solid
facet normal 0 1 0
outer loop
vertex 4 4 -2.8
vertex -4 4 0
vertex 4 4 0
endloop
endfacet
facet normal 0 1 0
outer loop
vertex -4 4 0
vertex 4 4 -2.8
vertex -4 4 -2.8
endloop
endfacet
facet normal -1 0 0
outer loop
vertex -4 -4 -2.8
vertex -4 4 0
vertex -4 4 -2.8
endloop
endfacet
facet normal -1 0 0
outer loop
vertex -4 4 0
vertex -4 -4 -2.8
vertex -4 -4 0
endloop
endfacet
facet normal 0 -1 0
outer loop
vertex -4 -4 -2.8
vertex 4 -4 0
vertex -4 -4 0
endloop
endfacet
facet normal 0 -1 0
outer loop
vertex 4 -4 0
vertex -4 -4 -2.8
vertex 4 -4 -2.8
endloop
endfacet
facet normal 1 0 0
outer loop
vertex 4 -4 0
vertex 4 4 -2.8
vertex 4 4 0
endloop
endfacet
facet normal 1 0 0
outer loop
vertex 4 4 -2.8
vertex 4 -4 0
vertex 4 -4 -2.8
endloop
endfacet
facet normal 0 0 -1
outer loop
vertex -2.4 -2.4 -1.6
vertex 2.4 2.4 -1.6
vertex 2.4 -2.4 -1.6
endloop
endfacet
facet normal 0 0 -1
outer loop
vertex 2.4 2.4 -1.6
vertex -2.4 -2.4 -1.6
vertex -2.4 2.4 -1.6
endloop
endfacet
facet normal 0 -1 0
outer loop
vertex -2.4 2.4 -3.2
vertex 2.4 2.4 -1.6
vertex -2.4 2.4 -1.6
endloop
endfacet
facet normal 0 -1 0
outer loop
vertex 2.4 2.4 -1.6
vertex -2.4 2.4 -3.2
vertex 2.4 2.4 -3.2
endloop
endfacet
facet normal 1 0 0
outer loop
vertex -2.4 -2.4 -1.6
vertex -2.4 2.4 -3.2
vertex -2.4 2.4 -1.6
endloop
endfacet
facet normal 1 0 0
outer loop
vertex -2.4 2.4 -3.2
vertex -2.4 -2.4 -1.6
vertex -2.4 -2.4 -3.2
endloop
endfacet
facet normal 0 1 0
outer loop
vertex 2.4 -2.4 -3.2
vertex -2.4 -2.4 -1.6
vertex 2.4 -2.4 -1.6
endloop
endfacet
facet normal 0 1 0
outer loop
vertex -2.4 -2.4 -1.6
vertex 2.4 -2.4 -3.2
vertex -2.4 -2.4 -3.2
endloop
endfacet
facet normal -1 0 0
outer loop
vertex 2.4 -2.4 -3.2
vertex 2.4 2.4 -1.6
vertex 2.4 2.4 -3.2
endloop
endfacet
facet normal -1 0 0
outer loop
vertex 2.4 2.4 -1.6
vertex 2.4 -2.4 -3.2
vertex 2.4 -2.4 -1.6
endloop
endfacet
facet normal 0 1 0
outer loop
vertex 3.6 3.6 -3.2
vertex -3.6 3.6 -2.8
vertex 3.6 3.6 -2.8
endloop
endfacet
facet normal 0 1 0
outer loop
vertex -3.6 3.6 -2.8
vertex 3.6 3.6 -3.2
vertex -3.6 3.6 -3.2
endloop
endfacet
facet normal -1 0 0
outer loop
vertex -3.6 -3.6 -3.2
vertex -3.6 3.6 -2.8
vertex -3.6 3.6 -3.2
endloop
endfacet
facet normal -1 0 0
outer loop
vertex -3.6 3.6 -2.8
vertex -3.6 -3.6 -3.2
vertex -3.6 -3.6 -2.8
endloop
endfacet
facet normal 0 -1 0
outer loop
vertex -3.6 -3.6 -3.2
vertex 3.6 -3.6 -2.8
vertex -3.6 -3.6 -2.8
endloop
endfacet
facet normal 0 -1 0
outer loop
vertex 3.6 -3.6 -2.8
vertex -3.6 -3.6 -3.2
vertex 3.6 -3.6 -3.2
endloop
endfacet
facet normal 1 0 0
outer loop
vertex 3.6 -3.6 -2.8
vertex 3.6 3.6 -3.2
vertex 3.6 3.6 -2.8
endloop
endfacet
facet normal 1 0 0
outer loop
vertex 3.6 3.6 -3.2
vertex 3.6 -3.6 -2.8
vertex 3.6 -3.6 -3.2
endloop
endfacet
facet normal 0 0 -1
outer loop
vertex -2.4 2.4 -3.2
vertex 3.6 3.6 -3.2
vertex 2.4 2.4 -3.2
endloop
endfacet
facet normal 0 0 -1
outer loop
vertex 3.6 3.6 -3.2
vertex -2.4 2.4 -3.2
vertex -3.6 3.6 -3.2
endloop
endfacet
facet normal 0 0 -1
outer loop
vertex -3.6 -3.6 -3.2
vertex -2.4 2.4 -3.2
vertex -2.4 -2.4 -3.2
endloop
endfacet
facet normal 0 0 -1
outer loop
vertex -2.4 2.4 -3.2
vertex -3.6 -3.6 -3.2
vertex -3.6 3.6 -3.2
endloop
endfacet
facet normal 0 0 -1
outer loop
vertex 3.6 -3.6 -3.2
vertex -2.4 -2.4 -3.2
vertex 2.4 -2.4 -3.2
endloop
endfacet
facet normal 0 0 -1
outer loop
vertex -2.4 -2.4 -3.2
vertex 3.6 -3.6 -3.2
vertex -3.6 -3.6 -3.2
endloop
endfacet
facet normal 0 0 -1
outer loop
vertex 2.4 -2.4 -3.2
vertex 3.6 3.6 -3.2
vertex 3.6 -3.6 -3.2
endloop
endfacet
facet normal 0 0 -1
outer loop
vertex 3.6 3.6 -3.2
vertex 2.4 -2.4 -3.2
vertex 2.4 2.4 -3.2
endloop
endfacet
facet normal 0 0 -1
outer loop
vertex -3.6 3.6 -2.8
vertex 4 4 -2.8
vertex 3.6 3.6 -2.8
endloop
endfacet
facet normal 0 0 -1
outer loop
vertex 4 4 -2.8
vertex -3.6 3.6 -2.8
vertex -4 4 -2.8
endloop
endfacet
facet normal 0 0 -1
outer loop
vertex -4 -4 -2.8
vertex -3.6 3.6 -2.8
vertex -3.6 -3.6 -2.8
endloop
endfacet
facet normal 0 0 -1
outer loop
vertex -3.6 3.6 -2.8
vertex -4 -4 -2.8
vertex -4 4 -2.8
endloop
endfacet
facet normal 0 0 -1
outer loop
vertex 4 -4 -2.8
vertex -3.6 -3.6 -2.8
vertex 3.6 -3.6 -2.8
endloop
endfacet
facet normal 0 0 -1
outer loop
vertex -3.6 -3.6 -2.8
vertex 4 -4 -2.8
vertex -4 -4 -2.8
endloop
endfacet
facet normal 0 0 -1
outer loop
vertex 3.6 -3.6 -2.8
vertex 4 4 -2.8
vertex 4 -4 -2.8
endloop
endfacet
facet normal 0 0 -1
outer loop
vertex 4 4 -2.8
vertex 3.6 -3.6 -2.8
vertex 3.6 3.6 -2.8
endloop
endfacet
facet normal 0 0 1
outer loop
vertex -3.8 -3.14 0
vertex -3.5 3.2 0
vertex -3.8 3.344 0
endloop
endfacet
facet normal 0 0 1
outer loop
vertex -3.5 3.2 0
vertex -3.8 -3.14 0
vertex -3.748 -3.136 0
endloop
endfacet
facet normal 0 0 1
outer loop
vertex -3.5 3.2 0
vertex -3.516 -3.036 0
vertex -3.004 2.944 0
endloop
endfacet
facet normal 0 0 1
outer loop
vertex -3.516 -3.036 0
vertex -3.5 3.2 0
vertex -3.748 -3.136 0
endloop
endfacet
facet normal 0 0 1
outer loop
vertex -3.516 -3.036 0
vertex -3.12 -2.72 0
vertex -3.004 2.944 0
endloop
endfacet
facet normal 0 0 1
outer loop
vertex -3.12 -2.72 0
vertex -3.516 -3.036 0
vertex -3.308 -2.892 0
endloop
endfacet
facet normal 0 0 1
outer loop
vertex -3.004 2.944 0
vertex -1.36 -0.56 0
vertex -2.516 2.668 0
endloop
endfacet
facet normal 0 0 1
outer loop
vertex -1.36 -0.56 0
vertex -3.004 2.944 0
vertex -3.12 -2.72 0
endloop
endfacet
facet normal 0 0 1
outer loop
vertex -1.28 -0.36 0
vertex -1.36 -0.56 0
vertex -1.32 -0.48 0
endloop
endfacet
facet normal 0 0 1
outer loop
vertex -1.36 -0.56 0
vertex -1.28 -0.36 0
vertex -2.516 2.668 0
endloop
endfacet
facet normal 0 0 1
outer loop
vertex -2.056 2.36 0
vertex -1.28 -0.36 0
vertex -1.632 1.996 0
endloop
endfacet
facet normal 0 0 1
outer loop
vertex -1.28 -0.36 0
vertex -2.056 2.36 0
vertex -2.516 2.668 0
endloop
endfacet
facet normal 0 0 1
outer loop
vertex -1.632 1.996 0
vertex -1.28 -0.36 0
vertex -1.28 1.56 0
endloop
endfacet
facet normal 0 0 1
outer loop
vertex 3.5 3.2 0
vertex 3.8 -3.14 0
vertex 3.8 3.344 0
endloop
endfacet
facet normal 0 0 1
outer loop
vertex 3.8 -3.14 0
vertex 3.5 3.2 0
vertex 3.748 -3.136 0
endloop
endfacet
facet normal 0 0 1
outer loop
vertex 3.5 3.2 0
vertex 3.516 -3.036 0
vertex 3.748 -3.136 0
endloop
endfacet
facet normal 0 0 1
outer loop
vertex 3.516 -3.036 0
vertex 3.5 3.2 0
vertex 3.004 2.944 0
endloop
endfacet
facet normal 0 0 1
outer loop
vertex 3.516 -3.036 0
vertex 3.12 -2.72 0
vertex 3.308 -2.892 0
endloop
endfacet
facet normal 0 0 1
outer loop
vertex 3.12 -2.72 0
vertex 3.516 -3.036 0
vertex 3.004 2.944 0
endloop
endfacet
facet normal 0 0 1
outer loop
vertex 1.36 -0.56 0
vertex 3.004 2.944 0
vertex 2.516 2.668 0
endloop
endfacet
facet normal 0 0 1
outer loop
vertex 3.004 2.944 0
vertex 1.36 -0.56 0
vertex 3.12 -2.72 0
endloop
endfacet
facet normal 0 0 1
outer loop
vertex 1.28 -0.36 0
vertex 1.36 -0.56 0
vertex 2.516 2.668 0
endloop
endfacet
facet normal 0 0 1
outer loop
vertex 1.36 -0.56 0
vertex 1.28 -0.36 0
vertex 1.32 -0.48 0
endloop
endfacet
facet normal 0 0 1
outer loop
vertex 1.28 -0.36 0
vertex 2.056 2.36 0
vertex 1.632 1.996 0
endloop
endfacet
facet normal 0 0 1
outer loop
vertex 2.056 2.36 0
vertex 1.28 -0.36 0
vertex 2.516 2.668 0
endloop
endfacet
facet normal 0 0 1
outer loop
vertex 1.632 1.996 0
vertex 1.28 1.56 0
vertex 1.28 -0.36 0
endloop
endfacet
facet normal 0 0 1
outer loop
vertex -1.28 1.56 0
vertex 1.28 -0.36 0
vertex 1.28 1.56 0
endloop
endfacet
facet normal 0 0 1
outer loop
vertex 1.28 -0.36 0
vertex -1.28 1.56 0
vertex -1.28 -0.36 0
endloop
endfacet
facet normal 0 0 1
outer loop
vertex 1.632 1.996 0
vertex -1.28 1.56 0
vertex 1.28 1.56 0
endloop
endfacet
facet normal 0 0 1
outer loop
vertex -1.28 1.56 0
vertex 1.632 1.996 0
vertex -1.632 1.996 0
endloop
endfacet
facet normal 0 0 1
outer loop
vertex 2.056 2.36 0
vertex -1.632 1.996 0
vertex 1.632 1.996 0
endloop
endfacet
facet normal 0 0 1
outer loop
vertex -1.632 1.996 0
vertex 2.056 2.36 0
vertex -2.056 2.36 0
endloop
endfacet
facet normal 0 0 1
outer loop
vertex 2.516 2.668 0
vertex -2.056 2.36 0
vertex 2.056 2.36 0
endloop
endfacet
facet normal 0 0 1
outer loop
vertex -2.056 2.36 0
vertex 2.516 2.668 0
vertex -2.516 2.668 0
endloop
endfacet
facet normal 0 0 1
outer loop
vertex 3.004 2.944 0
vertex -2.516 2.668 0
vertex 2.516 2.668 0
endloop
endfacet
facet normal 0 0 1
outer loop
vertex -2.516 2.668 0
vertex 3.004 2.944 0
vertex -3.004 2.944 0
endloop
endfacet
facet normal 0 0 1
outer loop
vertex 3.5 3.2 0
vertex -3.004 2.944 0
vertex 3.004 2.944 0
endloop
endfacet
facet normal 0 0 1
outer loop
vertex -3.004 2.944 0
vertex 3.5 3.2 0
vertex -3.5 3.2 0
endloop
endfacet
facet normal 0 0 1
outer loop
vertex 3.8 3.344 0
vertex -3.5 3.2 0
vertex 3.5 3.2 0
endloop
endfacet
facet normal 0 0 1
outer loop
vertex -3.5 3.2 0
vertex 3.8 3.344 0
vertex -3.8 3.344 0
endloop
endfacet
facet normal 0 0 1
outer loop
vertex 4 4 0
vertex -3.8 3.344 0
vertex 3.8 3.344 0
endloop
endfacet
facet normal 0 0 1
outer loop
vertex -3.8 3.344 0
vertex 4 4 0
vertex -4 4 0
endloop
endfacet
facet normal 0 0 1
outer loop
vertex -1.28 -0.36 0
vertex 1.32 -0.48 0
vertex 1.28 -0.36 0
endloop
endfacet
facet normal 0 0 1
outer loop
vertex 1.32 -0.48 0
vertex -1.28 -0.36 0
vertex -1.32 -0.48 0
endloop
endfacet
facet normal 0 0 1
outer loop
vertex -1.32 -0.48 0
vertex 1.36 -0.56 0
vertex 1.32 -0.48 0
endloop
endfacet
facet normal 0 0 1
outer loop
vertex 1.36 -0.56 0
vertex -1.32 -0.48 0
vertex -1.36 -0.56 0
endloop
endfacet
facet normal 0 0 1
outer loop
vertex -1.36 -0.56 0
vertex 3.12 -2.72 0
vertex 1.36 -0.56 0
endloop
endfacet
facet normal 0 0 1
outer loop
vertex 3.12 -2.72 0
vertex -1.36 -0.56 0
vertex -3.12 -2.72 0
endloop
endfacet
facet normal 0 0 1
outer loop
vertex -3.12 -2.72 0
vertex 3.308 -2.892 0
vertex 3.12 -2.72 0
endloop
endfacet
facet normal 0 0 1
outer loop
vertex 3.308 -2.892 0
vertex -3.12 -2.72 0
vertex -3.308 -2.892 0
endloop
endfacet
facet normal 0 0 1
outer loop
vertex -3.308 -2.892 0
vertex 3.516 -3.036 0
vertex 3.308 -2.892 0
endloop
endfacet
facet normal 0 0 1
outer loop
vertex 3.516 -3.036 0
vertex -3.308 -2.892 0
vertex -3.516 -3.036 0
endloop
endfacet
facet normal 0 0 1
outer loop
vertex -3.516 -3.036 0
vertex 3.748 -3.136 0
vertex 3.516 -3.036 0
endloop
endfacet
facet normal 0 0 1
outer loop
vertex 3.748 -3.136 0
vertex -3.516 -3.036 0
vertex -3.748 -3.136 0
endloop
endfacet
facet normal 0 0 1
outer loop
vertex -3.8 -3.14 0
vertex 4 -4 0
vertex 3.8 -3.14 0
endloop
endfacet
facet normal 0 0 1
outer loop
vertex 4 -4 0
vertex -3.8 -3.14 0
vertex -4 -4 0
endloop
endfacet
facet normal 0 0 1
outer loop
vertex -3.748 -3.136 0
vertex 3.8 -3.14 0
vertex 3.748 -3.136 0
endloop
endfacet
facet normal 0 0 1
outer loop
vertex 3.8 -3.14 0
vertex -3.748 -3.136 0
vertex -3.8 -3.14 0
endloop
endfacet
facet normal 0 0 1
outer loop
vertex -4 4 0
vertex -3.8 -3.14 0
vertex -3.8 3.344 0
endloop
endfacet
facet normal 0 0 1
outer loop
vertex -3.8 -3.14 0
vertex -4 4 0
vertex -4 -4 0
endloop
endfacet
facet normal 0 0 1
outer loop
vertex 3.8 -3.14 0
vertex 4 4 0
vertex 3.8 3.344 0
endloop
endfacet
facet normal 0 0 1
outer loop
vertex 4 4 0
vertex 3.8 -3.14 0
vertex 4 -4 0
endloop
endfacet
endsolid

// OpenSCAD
// file: ../p/box5.scad
use <../lib.scad>
function ldraw_lib__box5() = [
// 0 Box with 5 Faces and All Edges
// 0 Name: box5.dat
// 0 Author: James Jessiman
// 0 !LDRAW_ORG Primitive UPDATE 2012-01
// 0 !LICENSE Licensed under CC BY 4.0 : see CAreadme.txt
// 
// 0 BFC CERTIFY CCW
  [0,"BFC","CERTIFY"],
  [0,"BFC","CCW"],
// 
// 0 !HISTORY 2002-04-03 [sbliss] Modified for BFC compliance
// 0 !HISTORY 2002-04-25 [PTadmin] Official Update 2002-02
// 0 !HISTORY 2007-06-24 [PTadmin] Header formatted for Contributor Agreement
// 0 !HISTORY 2008-07-01 [PTadmin] Official Update 2008-01
// 0 !HISTORY 2012-02-16 [Philo] Changed to CCW
// 0 !HISTORY 2012-03-30 [PTadmin] Official Update 2012-01
// 
// 
// 2 24 1 1 1 -1 1 1
  [2,24,1,1,1,-1,1,1],
// 2 24 -1 1 1 -1 1 -1
  [2,24,-1,1,1,-1,1,-1],
// 2 24 -1 1 -1 1 1 -1
  [2,24,-1,1,-1,1,1,-1],
// 2 24 1 1 -1 1 1 1
  [2,24,1,1,-1,1,1,1],
// 2 24 1 0 1 -1 0 1
  [2,24,1,0,1,-1,0,1],
// 2 24 -1 0 1 -1 0 -1
  [2,24,-1,0,1,-1,0,-1],
// 2 24 -1 0 -1 1 0 -1
  [2,24,-1,0,-1,1,0,-1],
// 2 24 1 0 -1 1 0 1
  [2,24,1,0,-1,1,0,1],
// 2 24 1 0 1 1 1 1
  [2,24,1,0,1,1,1,1],
// 2 24 -1 0 1 -1 1 1
  [2,24,-1,0,1,-1,1,1],
// 2 24 1 0 -1 1 1 -1
  [2,24,1,0,-1,1,1,-1],
// 2 24 -1 0 -1 -1 1 -1
  [2,24,-1,0,-1,-1,1,-1],
// 4 16 -1 1 1 1 1 1 1 1 -1 -1 1 -1
  [4,16,-1,1,1,1,1,1,1,1,-1,-1,1,-1],
// 4 16 -1 1 1 -1 0 1 1 0 1 1 1 1
  [4,16,-1,1,1,-1,0,1,1,0,1,1,1,1],
// 4 16 -1 1 -1 -1 0 -1 -1 0 1 -1 1 1
  [4,16,-1,1,-1,-1,0,-1,-1,0,1,-1,1,1],
// 4 16 1 1 -1 1 0 -1 -1 0 -1 -1 1 -1
  [4,16,1,1,-1,1,0,-1,-1,0,-1,-1,1,-1],
// 4 16 1 1 1 1 0 1 1 0 -1 1 1 -1
  [4,16,1,1,1,1,0,1,1,0,-1,1,1,-1],
];
module ldraw_lib__box5(step=0, col=false, unit=2/5, alt=false, line=0.2, solid=!$preview)
    makepoly(ldraw_lib__box5(), step=step, col=col, unit=unit, alt=alt, line=line, solid=solid);
ldraw_lib__box5(line=0.2);
// file: ../p/box4.scad
use <../lib.scad>
function ldraw_lib__box4() = [
// 0 Box with 4 Faces (2 Parallel Pairs) and All Edges
// 0 Name: box4.dat
// 0 Author: James Jessiman
// 0 !LDRAW_ORG Primitive UPDATE 2012-01
// 0 !LICENSE Licensed under CC BY 4.0 : see CAreadme.txt
// 
// 0 BFC CERTIFY CCW
  [0,"BFC","CERTIFY"],
  [0,"BFC","CCW"],
// 
// 0 !HISTORY 2002-04-03 [sbliss] Modified for BFC compliance
// 0 !HISTORY 2002-04-25 [PTadmin] Official Update 2002-02
// 0 !HISTORY 2007-06-24 [PTadmin] Header formatted for Contributor Agreement
// 0 !HISTORY 2008-07-01 [PTadmin] Official Update 2008-01
// 0 !HISTORY 2012-02-16 [Philo] Changed to CCW
// 0 !HISTORY 2012-03-30 [PTadmin] Official Update 2012-01
// 
// 
// 2 24 1 1 1 -1 1 1
  [2,24,1,1,1,-1,1,1],
// 2 24 -1 1 1 -1 1 -1
  [2,24,-1,1,1,-1,1,-1],
// 2 24 -1 1 -1 1 1 -1
  [2,24,-1,1,-1,1,1,-1],
// 2 24 1 1 -1 1 1 1
  [2,24,1,1,-1,1,1,1],
// 2 24 1 0 1 -1 0 1
  [2,24,1,0,1,-1,0,1],
// 2 24 -1 0 1 -1 0 -1
  [2,24,-1,0,1,-1,0,-1],
// 2 24 -1 0 -1 1 0 -1
  [2,24,-1,0,-1,1,0,-1],
// 2 24 1 0 -1 1 0 1
  [2,24,1,0,-1,1,0,1],
// 2 24 1 0 1 1 1 1
  [2,24,1,0,1,1,1,1],
// 2 24 -1 0 1 -1 1 1
  [2,24,-1,0,1,-1,1,1],
// 2 24 1 0 -1 1 1 -1
  [2,24,1,0,-1,1,1,-1],
// 2 24 -1 0 -1 -1 1 -1
  [2,24,-1,0,-1,-1,1,-1],
// 4 16 -1 1 1 -1 0 1 1 0 1 1 1 1
  [4,16,-1,1,1,-1,0,1,1,0,1,1,1,1],
// 4 16 -1 1 -1 -1 0 -1 -1 0 1 -1 1 1
  [4,16,-1,1,-1,-1,0,-1,-1,0,1,-1,1,1],
// 4 16 1 1 -1 1 0 -1 -1 0 -1 -1 1 -1
  [4,16,1,1,-1,1,0,-1,-1,0,-1,-1,1,-1],
// 4 16 1 1 1 1 0 1 1 0 -1 1 1 -1
  [4,16,1,1,1,1,0,1,1,0,-1,1,1,-1],
];
module ldraw_lib__box4(step=0, col=false, unit=2/5, alt=false, line=0.2, solid=!$preview)
    makepoly(ldraw_lib__box4(), step=step, col=col, unit=unit, alt=alt, line=line, solid=solid);
ldraw_lib__box4(line=0.2);
// file: s/3070bs01.scad
use <../../lib.scad>
use <../../p/box4.scad>
use <../../p/box5.scad>
function ldraw_lib__s__3070bs01() = [
// 0 ~Tile  1 x  1 with Groove without Top Face
// 0 Name: s\3070bs01.dat
// 0 Author: Chris Dee [cwdee]
// 0 !LDRAW_ORG Subpart UPDATE 2009-02
// 0 !LICENSE Licensed under CC BY 4.0 : see CAreadme.txt
// 
// 0 BFC CERTIFY CCW
  [0,"BFC","CERTIFY"],
  [0,"BFC","CCW"],
// 
// 0 !HISTORY 2009-09-03 [PTadmin] Official Update 2009-02
// 
// 
// 1 16 0 0 0 10 0 0 0 7 0 0 0 10 box4.dat
  [1,16,0,0,0,10,0,0,0,7,0,0,0,10, ldraw_lib__box4()],
// 0 BFC INVERTNEXT
  [0,"BFC","INVERTNEXT"],
// 1 16 0 8 0 6 0 0 0 -4 0 0 0 6 box5.dat
  [1,16,0,8,0,6,0,0,0,-4,0,0,0,6, ldraw_lib__box5()],
// 1 16 0 7 0 9 0 0 0 1 0 0 0 9 box4.dat
  [1,16,0,7,0,9,0,0,0,1,0,0,0,9, ldraw_lib__box4()],
// 
// 4 16 9 8 9 6 8 6 -6 8 6 -9 8 9
  [4,16,9,8,9,6,8,6,-6,8,6,-9,8,9],
// 4 16 -9 8 9 -6 8 6 -6 8 -6 -9 8 -9
  [4,16,-9,8,9,-6,8,6,-6,8,-6,-9,8,-9],
// 4 16 -9 8 -9 -6 8 -6 6 8 -6 9 8 -9
  [4,16,-9,8,-9,-6,8,-6,6,8,-6,9,8,-9],
// 4 16 9 8 -9 6 8 -6 6 8 6 9 8 9
  [4,16,9,8,-9,6,8,-6,6,8,6,9,8,9],
// 
// 4 16 10 7 10 9 7 9 -9 7 9 -10 7 10
  [4,16,10,7,10,9,7,9,-9,7,9,-10,7,10],
// 4 16 -10 7 10 -9 7 9 -9 7 -9 -10 7 -10
  [4,16,-10,7,10,-9,7,9,-9,7,-9,-10,7,-10],
// 4 16 -10 7 -10 -9 7 -9 9 7 -9 10 7 -10
  [4,16,-10,7,-10,-9,7,-9,9,7,-9,10,7,-10],
// 4 16 10 7 -10 9 7 -9 9 7 9 10 7 10
  [4,16,10,7,-10,9,7,-9,9,7,9,10,7,10],
// 0
];
module ldraw_lib__s__3070bs01(step=0, col=false, unit=2/5, alt=false, line=0.2, solid=!$preview)
    makepoly(ldraw_lib__s__3070bs01(), step=step, col=col, unit=unit, alt=alt, line=line, solid=solid);
ldraw_lib__s__3070bs01(line=0.2);
// main file
use <../lib.scad>
use <s/3070bs01.scad>
function ldraw_lib__3070bpy1() = [
// 0 Tile  1 x  1 with Black Symmetrical Trapezoids Pattern
// 0 Name: 3070bpy1.dat
// 0 Author: Bertrand Lequy [Berth]
// 0 !LDRAW_ORG Part UPDATE 2024-07
// 0 !LICENSE Licensed under CC BY 4.0 : see CAreadme.txt
// 
// 0 BFC CERTIFY CCW
  [0,"BFC","CERTIFY"],
  [0,"BFC","CCW"],
// 
// 0 !KEYWORDS Bricklink 3070pb355, Rebrickable 3070bpr0312, Set 76922
// 
// 0 !HISTORY 2024-08-26 [OrionP] Official Update 2024-07
// 
// 1 16 0 0 0 1 0 0 0 1 0 0 0 1 s\3070bs01.dat
  [1,16,0,0,0,1,0,0,0,1,0,0,0,1, ldraw_lib__s__3070bs01()],
// 4 0 -9.37 0 -7.84 -8.75 0 8 -9.5 0 8.36 -9.5 0 -7.85
  [4,0,-9.37,0,-7.84,-8.75,0,8,-9.5,0,8.36,-9.5,0,-7.85],
// 4 0 -8.75 0 8 -9.37 0 -7.84 -8.79 0 -7.59 -7.51 0 7.36
  [4,0,-8.75,0,8,-9.37,0,-7.84,-8.79,0,-7.59,-7.51,0,7.36],
// 4 0 -7.51 0 7.36 -8.79 0 -7.59 -8.27 0 -7.23 -7.8 0 -6.8
  [4,0,-7.51,0,7.36,-8.79,0,-7.59,-8.27,0,-7.23,-7.8,0,-6.8],
// 4 0 -6.29 0 6.67 -7.51 0 7.36 -7.8 0 -6.8 -3.4 0 -1.4
  [4,0,-6.29,0,6.67,-7.51,0,7.36,-7.8,0,-6.8,-3.4,0,-1.4],
// 4 0 -6.29 0 6.67 -3.4 0 -1.4 -3.3 0 -1.2 -3.2 0 -0.9
  [4,0,-6.29,0,6.67,-3.4,0,-1.4,-3.3,0,-1.2,-3.2,0,-0.9],
// 4 0 -5.14 0 5.9 -6.29 0 6.67 -3.2 0 -0.9 -4.08 0 4.99
  [4,0,-5.14,0,5.9,-6.29,0,6.67,-3.2,0,-0.9,-4.08,0,4.99],
// 3 0 -4.08 0 4.99 -3.2 0 -0.9 -3.2 0 3.9
  [3,0,-4.08,0,4.99,-3.2,0,-0.9,-3.2,0,3.9],
// 4 0 9.5 0 8.36 8.75 0 8 9.37 0 -7.84 9.5 0 -7.85
  [4,0,9.5,0,8.36,8.75,0,8,9.37,0,-7.84,9.5,0,-7.85],
// 4 0 8.79 0 -7.59 9.37 0 -7.84 8.75 0 8 7.51 0 7.36
  [4,0,8.79,0,-7.59,9.37,0,-7.84,8.75,0,8,7.51,0,7.36],
// 4 0 8.27 0 -7.23 8.79 0 -7.59 7.51 0 7.36 7.8 0 -6.8
  [4,0,8.27,0,-7.23,8.79,0,-7.59,7.51,0,7.36,7.8,0,-6.8],
// 4 0 7.8 0 -6.8 7.51 0 7.36 6.29 0 6.67 3.4 0 -1.4
  [4,0,7.8,0,-6.8,7.51,0,7.36,6.29,0,6.67,3.4,0,-1.4],
// 4 0 3.3 0 -1.2 3.4 0 -1.4 6.29 0 6.67 3.2 0 -0.9
  [4,0,3.3,0,-1.2,3.4,0,-1.4,6.29,0,6.67,3.2,0,-0.9],
// 4 0 3.2 0 -0.9 6.29 0 6.67 5.14 0 5.9 4.08 0 4.99
  [4,0,3.2,0,-0.9,6.29,0,6.67,5.14,0,5.9,4.08,0,4.99],
// 3 0 4.08 0 4.99 3.2 0 3.9 3.2 0 -0.9
  [3,0,4.08,0,4.99,3.2,0,3.9,3.2,0,-0.9],
// 4 16 3.2 0 3.9 -3.2 0 3.9 -3.2 0 -0.9 3.2 0 -0.9
  [4,16,3.2,0,3.9,-3.2,0,3.9,-3.2,0,-0.9,3.2,0,-0.9],
// 4 16 -4.08 0 4.99 -3.2 0 3.9 3.2 0 3.9 4.08 0 4.99
  [4,16,-4.08,0,4.99,-3.2,0,3.9,3.2,0,3.9,4.08,0,4.99],
// 4 16 -5.14 0 5.9 -4.08 0 4.99 4.08 0 4.99 5.14 0 5.9
  [4,16,-5.14,0,5.9,-4.08,0,4.99,4.08,0,4.99,5.14,0,5.9],
// 4 16 -6.29 0 6.67 -5.14 0 5.9 5.14 0 5.9 6.29 0 6.67
  [4,16,-6.29,0,6.67,-5.14,0,5.9,5.14,0,5.9,6.29,0,6.67],
// 4 16 -7.51 0 7.36 -6.29 0 6.67 6.29 0 6.67 7.51 0 7.36
  [4,16,-7.51,0,7.36,-6.29,0,6.67,6.29,0,6.67,7.51,0,7.36],
// 4 16 -8.75 0 8 -7.51 0 7.36 7.51 0 7.36 8.75 0 8
  [4,16,-8.75,0,8,-7.51,0,7.36,7.51,0,7.36,8.75,0,8],
// 4 16 -9.5 0 8.36 -8.75 0 8 8.75 0 8 9.5 0 8.36
  [4,16,-9.5,0,8.36,-8.75,0,8,8.75,0,8,9.5,0,8.36],
// 4 16 -9.5 0 8.36 9.5 0 8.36 10 0 10 -10 0 10
  [4,16,-9.5,0,8.36,9.5,0,8.36,10,0,10,-10,0,10],
// 4 16 -3.2 0 -0.9 -3.3 0 -1.2 3.3 0 -1.2 3.2 0 -0.9
  [4,16,-3.2,0,-0.9,-3.3,0,-1.2,3.3,0,-1.2,3.2,0,-0.9],
// 4 16 -3.3 0 -1.2 -3.4 0 -1.4 3.4 0 -1.4 3.3 0 -1.2
  [4,16,-3.3,0,-1.2,-3.4,0,-1.4,3.4,0,-1.4,3.3,0,-1.2],
// 4 16 -3.4 0 -1.4 -7.8 0 -6.8 7.8 0 -6.8 3.4 0 -1.4
  [4,16,-3.4,0,-1.4,-7.8,0,-6.8,7.8,0,-6.8,3.4,0,-1.4],
// 4 16 -7.8 0 -6.8 -8.27 0 -7.23 8.27 0 -7.23 7.8 0 -6.8
  [4,16,-7.8,0,-6.8,-8.27,0,-7.23,8.27,0,-7.23,7.8,0,-6.8],
// 4 16 -8.27 0 -7.23 -8.79 0 -7.59 8.79 0 -7.59 8.27 0 -7.23
  [4,16,-8.27,0,-7.23,-8.79,0,-7.59,8.79,0,-7.59,8.27,0,-7.23],
// 4 16 -8.79 0 -7.59 -9.37 0 -7.84 9.37 0 -7.84 8.79 0 -7.59
  [4,16,-8.79,0,-7.59,-9.37,0,-7.84,9.37,0,-7.84,8.79,0,-7.59],
// 4 16 -9.5 0 -7.85 -10 0 -10 10 0 -10 9.5 0 -7.85
  [4,16,-9.5,0,-7.85,-10,0,-10,10,0,-10,9.5,0,-7.85],
// 4 16 -9.37 0 -7.84 -9.5 0 -7.85 9.5 0 -7.85 9.37 0 -7.84
  [4,16,-9.37,0,-7.84,-9.5,0,-7.85,9.5,0,-7.85,9.37,0,-7.84],
// 4 16 -10 0 10 -10 0 -10 -9.5 0 -7.85 -9.5 0 8.36
  [4,16,-10,0,10,-10,0,-10,-9.5,0,-7.85,-9.5,0,8.36],
// 4 16 10 0 -10 10 0 10 9.5 0 8.36 9.5 0 -7.85
  [4,16,10,0,-10,10,0,10,9.5,0,8.36,9.5,0,-7.85],
];
module ldraw_lib__3070bpy1(step=0, col=false, unit=2/5, alt=false, line=0.2, solid=!$preview)
    makepoly(ldraw_lib__3070bpy1(), step=step, col=col, unit=unit, alt=alt, line=line, solid=solid);
ldraw_lib__3070bpy1(line=0.2);
